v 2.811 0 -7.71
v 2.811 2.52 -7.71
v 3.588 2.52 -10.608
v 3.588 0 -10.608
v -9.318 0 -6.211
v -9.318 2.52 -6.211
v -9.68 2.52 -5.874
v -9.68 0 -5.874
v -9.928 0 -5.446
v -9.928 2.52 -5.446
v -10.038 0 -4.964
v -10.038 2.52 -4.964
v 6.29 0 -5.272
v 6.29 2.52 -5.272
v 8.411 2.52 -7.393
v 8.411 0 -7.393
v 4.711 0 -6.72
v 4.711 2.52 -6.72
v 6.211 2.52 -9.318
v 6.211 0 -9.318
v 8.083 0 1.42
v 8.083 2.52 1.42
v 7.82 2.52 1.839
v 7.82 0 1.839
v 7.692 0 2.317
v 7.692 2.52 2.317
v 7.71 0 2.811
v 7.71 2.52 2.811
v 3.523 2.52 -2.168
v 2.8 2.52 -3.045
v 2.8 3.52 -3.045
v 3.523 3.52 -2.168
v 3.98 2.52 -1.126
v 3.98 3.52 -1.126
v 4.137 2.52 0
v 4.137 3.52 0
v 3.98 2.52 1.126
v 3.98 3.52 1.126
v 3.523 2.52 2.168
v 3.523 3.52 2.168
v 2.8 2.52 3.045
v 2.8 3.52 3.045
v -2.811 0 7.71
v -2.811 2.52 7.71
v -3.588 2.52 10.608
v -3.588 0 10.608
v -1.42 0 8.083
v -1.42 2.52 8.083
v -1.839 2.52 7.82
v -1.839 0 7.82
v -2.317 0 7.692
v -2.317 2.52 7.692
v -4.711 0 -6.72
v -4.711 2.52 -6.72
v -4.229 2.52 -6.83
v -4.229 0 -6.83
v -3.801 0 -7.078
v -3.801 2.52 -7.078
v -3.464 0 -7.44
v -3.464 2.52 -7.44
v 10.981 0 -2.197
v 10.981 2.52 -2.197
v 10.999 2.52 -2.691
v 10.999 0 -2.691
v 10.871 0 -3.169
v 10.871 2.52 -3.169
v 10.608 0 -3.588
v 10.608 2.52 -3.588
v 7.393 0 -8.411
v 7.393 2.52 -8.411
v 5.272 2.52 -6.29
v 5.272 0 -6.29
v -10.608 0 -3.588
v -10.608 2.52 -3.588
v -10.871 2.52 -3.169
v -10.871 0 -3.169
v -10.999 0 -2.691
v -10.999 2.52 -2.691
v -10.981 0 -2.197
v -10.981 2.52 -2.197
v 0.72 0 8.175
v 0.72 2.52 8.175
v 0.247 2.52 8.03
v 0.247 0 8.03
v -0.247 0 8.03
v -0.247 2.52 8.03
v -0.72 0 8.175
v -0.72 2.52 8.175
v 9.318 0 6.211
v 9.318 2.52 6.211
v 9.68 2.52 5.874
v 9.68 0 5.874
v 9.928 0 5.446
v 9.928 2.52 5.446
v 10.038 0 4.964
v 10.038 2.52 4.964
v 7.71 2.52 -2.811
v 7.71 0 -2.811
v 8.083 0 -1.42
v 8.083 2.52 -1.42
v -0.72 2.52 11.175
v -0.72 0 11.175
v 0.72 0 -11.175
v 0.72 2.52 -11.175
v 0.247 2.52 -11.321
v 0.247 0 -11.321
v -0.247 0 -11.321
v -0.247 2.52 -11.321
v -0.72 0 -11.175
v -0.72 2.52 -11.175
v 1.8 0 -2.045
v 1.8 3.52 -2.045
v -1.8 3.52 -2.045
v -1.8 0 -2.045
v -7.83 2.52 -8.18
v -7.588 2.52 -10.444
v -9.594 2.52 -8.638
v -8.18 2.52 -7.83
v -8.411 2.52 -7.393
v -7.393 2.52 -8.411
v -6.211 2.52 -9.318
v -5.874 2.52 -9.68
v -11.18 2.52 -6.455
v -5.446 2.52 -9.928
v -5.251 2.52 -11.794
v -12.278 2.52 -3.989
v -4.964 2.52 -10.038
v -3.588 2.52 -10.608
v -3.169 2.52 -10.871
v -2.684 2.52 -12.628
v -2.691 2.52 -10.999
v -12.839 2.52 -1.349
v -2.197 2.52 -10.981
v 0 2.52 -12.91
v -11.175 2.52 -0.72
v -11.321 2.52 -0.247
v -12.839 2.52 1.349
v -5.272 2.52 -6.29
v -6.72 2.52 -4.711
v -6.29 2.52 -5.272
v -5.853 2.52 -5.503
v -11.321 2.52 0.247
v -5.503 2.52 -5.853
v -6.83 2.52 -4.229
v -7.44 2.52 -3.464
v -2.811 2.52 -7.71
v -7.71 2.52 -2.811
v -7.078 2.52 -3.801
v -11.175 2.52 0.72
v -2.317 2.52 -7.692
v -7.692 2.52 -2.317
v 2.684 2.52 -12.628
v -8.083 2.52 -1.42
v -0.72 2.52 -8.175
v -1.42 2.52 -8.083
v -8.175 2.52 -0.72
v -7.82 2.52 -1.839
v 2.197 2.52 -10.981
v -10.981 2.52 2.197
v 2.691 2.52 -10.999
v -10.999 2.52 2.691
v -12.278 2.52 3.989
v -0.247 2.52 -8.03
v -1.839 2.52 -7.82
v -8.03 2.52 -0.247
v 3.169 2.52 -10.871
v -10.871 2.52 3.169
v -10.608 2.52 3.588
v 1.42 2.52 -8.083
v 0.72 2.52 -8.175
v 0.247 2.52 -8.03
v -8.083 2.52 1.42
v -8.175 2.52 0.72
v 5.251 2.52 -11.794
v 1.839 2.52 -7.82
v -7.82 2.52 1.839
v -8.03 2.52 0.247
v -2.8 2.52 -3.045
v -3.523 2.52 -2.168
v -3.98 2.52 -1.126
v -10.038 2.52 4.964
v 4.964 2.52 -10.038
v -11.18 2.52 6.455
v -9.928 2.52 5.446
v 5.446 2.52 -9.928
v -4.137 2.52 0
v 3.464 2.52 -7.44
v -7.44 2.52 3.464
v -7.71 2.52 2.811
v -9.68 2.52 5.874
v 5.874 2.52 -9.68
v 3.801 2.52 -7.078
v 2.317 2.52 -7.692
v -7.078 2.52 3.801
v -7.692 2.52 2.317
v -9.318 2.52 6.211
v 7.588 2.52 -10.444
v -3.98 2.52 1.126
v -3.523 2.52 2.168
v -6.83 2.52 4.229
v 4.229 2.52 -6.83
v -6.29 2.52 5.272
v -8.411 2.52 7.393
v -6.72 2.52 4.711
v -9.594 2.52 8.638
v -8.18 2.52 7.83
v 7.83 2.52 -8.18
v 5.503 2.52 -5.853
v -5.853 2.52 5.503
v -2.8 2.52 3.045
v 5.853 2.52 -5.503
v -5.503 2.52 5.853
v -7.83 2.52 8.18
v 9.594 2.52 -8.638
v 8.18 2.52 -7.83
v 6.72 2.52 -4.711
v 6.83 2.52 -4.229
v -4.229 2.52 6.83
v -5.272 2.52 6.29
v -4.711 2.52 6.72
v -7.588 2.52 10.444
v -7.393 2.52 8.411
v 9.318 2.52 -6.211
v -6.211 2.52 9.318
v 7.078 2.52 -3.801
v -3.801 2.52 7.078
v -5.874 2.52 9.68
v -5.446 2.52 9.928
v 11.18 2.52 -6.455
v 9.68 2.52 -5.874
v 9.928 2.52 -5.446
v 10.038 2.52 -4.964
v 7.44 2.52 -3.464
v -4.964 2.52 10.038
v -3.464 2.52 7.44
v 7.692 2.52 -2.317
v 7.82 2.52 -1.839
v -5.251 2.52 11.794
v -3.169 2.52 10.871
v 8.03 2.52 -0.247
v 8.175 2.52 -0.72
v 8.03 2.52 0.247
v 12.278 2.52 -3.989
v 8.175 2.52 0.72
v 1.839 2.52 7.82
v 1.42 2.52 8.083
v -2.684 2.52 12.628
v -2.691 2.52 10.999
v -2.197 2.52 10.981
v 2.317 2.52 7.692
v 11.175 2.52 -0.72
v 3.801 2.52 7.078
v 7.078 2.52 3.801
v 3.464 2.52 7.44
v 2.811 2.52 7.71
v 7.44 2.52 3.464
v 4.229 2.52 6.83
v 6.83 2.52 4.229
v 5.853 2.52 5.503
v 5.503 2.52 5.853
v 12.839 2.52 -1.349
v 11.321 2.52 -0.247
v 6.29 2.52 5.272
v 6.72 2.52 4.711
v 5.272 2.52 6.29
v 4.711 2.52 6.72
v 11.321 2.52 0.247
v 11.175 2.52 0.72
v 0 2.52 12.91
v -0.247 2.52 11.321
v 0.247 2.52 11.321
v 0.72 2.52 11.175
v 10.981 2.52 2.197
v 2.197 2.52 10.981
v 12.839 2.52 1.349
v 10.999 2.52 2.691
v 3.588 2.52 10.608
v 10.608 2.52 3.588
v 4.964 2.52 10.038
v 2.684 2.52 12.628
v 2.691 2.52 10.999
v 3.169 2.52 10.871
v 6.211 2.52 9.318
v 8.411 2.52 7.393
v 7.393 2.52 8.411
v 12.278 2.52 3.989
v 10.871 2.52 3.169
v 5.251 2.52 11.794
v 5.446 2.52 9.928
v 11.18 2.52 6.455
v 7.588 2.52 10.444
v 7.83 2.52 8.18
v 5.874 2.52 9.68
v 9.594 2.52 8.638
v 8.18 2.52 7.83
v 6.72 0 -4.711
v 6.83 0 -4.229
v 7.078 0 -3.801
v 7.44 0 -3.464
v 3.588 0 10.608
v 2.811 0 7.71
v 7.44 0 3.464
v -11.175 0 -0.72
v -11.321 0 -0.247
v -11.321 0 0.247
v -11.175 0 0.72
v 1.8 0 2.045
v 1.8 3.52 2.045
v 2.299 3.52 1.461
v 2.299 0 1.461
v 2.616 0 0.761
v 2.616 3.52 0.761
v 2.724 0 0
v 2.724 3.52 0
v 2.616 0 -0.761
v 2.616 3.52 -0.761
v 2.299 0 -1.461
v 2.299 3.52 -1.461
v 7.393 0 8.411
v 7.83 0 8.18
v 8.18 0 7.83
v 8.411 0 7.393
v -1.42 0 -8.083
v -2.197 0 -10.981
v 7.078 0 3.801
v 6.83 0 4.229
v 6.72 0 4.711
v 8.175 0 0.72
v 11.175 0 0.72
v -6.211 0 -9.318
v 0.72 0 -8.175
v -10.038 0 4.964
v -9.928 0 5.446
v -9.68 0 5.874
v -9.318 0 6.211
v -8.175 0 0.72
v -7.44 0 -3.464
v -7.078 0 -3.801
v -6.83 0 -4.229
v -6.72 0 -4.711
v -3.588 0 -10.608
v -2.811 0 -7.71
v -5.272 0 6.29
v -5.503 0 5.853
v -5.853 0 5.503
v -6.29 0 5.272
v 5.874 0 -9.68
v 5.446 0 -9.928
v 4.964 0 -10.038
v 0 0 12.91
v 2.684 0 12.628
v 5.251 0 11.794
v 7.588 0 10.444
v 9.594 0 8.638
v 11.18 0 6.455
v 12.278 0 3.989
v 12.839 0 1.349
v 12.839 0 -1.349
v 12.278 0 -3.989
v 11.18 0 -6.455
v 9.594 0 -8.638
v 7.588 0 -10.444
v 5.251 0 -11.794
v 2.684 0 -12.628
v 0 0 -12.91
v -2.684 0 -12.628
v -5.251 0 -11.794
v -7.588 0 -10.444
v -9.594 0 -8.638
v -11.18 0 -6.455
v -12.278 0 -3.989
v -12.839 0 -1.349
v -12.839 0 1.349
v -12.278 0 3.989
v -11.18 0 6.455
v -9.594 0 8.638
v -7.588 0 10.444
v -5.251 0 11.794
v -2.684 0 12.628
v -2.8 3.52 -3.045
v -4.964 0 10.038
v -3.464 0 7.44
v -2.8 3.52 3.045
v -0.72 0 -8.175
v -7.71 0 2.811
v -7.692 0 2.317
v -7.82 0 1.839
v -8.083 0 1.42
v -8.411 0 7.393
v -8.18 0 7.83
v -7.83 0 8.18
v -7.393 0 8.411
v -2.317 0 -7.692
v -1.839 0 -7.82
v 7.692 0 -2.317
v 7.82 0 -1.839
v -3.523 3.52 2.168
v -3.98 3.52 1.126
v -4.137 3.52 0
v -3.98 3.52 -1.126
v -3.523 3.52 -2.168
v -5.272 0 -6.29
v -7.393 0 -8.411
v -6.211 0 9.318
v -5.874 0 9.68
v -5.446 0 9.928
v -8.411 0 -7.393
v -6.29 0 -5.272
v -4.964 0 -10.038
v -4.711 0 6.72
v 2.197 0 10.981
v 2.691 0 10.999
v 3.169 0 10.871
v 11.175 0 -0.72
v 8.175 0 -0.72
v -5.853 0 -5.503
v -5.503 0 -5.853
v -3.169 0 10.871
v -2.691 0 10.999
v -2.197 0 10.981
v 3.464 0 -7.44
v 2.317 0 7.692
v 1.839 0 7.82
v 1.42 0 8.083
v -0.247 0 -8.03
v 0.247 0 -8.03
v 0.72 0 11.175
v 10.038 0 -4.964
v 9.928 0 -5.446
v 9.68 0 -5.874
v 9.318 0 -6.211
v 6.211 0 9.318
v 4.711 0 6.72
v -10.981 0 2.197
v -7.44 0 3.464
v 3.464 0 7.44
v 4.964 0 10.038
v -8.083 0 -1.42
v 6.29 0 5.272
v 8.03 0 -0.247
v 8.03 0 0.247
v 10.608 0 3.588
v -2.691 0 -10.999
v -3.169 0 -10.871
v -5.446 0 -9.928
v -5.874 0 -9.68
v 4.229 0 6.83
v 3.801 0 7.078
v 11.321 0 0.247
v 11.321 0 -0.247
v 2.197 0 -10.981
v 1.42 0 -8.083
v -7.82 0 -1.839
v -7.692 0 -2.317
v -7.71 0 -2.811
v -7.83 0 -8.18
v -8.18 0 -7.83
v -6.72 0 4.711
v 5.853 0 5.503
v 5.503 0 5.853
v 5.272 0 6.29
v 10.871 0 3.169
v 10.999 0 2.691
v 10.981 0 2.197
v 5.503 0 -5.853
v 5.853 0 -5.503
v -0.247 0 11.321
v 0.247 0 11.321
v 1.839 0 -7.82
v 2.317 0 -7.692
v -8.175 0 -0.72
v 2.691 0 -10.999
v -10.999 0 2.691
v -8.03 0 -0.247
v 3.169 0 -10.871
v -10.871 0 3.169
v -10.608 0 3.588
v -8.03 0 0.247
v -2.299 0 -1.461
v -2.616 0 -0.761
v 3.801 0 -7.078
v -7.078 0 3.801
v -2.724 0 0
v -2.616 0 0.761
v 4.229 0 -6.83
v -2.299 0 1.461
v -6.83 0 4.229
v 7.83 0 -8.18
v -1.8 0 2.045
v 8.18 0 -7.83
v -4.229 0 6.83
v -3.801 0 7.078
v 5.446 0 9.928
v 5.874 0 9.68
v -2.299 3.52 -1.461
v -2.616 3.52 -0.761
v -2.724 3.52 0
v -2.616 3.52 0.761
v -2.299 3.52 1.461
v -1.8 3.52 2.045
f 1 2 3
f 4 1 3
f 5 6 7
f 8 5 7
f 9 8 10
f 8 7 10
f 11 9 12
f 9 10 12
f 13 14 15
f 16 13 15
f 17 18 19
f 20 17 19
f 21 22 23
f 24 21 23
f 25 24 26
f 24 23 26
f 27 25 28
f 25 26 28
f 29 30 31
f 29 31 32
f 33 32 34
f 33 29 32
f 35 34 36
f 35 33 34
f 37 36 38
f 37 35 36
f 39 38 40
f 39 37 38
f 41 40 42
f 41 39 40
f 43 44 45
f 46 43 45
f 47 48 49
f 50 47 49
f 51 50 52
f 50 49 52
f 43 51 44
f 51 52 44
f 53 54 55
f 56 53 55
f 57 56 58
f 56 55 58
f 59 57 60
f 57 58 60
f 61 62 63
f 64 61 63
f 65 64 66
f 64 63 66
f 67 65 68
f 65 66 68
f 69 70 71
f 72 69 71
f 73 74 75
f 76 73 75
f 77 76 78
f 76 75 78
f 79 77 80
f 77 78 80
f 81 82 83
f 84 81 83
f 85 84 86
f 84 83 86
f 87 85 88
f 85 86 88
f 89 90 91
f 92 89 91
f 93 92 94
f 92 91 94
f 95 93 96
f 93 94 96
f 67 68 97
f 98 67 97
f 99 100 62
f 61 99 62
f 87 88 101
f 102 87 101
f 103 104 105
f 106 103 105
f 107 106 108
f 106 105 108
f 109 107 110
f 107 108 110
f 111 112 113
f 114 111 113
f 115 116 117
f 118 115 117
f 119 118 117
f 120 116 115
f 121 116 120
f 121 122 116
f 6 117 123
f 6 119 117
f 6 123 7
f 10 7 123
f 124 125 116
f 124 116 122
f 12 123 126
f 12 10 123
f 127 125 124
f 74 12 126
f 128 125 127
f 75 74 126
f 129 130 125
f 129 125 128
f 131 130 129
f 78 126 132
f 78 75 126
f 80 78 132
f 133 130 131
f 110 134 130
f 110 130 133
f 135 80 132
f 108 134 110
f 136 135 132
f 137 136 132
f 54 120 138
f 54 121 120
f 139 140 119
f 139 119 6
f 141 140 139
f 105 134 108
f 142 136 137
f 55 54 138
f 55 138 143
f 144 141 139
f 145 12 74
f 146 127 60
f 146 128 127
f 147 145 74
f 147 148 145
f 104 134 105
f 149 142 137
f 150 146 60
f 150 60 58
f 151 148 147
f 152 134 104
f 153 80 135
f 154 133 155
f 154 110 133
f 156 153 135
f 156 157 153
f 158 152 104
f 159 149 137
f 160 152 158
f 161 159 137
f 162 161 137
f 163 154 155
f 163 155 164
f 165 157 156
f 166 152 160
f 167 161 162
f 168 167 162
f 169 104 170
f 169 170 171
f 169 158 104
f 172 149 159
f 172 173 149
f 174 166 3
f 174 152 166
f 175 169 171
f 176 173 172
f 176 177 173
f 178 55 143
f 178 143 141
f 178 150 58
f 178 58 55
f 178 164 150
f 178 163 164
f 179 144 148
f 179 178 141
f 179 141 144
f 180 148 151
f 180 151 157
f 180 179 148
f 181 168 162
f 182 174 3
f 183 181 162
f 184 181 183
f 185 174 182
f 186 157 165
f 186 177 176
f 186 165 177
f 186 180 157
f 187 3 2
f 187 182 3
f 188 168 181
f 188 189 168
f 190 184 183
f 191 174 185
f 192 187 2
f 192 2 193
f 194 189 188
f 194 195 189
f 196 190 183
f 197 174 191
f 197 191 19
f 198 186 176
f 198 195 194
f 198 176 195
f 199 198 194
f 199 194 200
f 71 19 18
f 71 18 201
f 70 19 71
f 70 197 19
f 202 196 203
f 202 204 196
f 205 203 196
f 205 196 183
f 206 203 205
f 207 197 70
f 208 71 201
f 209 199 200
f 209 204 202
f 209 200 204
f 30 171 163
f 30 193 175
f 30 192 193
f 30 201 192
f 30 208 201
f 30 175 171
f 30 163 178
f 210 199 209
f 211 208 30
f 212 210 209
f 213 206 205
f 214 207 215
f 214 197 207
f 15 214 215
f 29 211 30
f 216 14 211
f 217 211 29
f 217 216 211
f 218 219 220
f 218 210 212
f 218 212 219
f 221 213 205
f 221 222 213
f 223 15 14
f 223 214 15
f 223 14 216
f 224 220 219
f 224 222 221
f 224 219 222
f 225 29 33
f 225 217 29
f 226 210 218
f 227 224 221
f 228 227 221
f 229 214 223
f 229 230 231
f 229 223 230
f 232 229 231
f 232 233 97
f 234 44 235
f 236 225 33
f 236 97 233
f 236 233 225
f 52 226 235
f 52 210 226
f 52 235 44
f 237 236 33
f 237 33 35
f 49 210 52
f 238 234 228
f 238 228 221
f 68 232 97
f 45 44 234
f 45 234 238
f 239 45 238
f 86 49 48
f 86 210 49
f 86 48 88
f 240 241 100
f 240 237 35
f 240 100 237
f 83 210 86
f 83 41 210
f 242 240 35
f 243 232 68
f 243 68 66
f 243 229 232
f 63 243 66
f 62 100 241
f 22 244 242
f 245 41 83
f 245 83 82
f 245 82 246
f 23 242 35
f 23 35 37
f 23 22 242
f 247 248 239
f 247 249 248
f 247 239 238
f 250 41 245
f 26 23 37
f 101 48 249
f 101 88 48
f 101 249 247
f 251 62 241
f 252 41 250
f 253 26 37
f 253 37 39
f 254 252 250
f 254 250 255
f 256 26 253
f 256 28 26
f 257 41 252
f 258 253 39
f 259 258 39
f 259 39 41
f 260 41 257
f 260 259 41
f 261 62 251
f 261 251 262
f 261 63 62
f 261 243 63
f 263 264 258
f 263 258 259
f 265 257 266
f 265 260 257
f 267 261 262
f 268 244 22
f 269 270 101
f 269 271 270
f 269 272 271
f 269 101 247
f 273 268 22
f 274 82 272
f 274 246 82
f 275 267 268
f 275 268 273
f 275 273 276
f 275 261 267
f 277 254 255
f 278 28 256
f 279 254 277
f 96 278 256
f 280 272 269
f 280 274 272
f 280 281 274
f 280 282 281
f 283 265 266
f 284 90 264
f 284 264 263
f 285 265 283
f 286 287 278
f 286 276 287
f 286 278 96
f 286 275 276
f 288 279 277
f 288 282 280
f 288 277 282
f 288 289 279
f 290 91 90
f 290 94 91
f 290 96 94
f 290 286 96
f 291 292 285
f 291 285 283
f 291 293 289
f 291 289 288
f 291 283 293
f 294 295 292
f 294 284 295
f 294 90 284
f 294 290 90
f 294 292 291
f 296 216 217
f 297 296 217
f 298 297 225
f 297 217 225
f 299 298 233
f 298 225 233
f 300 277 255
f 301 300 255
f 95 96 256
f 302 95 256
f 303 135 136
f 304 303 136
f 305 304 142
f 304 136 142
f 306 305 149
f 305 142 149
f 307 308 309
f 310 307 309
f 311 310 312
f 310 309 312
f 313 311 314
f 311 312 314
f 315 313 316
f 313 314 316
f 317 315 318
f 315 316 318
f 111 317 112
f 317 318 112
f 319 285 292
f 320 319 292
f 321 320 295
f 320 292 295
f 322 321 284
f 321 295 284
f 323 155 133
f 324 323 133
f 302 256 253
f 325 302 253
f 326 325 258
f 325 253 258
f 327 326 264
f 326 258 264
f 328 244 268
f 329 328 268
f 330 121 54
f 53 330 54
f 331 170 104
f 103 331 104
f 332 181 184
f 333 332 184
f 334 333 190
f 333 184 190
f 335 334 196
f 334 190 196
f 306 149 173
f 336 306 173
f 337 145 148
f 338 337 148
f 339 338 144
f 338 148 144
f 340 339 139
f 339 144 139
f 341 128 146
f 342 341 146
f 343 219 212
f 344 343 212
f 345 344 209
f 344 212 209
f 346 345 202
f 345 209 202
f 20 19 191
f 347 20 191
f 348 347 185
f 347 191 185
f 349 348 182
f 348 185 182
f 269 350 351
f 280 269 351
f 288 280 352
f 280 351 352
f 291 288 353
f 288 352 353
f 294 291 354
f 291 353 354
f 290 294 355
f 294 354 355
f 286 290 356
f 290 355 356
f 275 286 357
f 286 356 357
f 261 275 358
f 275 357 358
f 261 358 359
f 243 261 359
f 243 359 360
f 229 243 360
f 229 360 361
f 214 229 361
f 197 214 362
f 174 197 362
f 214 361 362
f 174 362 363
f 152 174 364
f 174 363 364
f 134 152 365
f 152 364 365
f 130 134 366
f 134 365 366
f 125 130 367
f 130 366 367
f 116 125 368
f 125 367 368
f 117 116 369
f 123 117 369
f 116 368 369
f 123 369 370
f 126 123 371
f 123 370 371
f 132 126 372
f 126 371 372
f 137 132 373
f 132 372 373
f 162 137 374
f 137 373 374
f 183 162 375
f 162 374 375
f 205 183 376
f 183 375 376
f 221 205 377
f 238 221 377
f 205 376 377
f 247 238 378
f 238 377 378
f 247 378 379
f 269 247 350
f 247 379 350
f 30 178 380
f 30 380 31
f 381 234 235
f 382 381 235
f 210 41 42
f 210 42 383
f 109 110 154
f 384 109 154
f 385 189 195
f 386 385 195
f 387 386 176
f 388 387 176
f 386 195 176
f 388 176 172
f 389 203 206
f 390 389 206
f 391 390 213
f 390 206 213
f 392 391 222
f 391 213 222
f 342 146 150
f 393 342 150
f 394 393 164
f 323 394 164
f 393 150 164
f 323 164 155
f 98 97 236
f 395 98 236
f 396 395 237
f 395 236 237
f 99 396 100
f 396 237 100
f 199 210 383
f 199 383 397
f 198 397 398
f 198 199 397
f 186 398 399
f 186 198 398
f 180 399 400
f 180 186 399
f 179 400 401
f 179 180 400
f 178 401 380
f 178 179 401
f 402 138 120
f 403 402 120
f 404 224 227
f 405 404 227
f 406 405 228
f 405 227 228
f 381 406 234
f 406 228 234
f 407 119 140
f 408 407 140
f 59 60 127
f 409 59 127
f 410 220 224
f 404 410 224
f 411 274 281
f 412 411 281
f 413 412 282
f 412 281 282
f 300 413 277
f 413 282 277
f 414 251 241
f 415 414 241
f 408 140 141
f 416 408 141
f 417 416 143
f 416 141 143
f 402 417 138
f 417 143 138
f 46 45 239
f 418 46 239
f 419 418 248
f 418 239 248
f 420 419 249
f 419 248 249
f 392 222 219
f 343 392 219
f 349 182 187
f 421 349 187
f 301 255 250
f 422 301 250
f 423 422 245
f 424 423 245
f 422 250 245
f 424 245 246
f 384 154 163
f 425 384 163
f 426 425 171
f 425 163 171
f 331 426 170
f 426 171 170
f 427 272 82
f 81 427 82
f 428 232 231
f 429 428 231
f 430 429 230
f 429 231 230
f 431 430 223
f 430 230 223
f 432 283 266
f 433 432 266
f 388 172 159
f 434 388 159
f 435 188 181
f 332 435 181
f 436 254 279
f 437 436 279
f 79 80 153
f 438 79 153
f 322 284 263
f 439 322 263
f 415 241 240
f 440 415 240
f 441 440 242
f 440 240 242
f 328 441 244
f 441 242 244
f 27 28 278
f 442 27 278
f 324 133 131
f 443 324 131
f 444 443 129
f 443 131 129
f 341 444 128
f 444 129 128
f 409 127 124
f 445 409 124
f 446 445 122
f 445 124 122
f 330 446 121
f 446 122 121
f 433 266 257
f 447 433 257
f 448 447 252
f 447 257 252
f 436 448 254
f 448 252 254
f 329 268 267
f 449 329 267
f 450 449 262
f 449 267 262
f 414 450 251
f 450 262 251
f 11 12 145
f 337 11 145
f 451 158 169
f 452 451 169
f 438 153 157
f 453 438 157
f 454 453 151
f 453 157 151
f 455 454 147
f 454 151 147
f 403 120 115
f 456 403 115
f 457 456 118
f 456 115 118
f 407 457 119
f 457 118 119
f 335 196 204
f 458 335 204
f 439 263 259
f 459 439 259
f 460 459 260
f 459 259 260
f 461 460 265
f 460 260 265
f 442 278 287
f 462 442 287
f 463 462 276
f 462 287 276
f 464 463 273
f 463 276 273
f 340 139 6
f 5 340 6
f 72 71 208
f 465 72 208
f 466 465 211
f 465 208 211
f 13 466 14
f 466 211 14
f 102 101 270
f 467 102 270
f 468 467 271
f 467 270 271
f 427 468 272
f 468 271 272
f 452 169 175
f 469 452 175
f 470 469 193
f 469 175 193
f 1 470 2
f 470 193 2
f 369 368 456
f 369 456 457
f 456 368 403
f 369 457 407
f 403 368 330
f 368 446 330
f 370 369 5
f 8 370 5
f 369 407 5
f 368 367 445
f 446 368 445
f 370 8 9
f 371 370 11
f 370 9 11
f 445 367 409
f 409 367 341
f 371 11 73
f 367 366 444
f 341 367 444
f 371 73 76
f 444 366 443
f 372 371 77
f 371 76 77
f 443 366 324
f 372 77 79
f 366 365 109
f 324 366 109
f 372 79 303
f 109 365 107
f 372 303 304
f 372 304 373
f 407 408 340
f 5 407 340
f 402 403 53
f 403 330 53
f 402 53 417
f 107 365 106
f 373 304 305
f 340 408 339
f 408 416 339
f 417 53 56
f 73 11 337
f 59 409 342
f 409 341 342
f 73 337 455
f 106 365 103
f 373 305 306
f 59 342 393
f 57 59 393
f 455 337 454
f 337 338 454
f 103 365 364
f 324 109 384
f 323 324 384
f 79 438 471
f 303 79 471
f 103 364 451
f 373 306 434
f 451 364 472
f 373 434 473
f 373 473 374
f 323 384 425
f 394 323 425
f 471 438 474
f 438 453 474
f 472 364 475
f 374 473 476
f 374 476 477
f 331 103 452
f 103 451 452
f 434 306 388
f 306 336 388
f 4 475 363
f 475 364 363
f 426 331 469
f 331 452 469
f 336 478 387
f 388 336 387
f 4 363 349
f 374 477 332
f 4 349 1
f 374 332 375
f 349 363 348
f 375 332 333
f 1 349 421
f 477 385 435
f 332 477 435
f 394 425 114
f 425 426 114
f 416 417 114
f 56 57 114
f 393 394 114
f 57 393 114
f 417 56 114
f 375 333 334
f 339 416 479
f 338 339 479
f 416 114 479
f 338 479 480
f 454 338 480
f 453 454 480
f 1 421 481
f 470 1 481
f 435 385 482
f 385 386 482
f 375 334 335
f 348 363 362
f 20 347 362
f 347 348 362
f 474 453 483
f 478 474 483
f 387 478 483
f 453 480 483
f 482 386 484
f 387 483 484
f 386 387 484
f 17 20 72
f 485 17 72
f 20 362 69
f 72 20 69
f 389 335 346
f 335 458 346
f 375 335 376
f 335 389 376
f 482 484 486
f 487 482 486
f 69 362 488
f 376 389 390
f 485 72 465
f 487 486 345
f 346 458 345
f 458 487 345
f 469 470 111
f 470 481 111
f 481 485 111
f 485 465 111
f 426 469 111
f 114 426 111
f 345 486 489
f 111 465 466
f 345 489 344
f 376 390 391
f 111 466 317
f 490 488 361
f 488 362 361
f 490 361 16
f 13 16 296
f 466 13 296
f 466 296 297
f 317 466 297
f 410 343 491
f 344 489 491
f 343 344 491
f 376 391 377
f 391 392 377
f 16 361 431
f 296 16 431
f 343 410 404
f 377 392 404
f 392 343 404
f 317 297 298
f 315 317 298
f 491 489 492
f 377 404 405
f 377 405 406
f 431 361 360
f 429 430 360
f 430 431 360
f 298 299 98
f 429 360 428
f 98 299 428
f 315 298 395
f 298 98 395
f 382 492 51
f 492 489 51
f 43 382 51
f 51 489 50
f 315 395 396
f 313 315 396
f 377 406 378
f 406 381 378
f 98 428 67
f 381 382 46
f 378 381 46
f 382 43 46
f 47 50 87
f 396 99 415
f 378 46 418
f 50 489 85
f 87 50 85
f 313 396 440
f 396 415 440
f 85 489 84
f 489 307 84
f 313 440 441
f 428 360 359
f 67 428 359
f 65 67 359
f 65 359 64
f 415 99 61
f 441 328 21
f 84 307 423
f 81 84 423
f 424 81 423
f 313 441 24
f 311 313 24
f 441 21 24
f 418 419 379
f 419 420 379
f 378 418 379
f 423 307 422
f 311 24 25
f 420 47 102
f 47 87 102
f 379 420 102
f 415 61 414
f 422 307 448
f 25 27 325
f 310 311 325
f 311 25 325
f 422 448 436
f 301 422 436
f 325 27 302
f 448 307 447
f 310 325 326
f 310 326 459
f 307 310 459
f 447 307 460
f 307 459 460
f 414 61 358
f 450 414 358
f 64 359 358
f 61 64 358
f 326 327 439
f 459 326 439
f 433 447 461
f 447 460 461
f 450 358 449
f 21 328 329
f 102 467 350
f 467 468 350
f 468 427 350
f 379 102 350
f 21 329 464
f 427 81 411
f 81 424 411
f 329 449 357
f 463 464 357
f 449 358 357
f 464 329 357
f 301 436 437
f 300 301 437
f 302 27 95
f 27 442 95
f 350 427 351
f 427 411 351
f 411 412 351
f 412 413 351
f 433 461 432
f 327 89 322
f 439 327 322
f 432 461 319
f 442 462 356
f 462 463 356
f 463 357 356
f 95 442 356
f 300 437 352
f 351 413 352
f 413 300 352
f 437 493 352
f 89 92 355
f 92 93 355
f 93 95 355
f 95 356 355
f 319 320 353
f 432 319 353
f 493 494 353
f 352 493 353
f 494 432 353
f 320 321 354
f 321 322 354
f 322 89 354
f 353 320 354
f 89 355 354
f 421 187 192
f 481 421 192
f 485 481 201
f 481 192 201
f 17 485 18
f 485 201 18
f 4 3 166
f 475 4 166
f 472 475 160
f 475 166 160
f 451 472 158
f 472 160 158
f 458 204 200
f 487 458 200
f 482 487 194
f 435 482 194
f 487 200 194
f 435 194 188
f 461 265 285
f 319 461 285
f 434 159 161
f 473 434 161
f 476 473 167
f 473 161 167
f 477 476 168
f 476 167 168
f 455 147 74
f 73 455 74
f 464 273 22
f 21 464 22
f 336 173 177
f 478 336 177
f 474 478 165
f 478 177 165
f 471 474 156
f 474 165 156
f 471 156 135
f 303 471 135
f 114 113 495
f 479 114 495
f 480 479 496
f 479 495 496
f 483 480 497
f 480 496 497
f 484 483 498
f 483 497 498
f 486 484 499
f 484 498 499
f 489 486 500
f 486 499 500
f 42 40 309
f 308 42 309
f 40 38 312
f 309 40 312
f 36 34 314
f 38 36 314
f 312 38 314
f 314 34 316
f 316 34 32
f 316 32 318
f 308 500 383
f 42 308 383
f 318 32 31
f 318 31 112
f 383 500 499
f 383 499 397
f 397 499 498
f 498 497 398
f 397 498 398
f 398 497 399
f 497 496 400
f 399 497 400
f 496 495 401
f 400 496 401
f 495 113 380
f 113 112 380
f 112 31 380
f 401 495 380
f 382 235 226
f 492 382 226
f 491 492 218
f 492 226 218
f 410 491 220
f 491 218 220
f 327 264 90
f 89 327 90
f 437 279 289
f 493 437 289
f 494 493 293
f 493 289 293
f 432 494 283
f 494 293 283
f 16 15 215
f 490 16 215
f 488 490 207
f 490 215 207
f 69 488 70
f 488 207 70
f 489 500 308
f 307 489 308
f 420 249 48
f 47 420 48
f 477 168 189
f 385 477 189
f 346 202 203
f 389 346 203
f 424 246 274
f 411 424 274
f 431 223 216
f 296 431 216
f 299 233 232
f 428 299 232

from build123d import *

# Parameters (mm, degrees)
SKETCH_1_R               = 12.91
EXTRUDE_1_DEPTH          = 2.52
EXTRUDE_2_DEPTH          = 1
CUT_EXTRUDE_1_DEPTH      = 4
CUT_EXTRUDE_2_DEPTH      = 4
PATTERN_CIRCULAR_1_COUNT = 24


with BuildPart() as part:
    # 草图1 → 凸台-拉伸1 (new body)
    with BuildSketch(Plane(origin=(0, 0, 0), x_dir=(1, 0, 0), z_dir=(0, 1, 0))):
        with Locations(Location((0, 0, 0), (0, 0, 270))):
            Circle(SKETCH_1_R)
    extrude(amount=EXTRUDE_1_DEPTH)

    # 草图2 → 凸台-拉伸2 (add)
    with BuildSketch(Plane(origin=(0, 2.52, 0), x_dir=(1, 0, 0), z_dir=(0, 1, 0))):
        with BuildLine():
            Line((-2.8, 3.045), (2.8, 3.045))
            ThreePointArc((2.8, 3.045), (4.136668345, 0), (2.8, -3.045))
            Line((2.8, -3.045), (-2.8, -3.045))
            ThreePointArc((-2.8, -3.045), (-4.136668345, 0), (-2.8, 3.045))
        make_face()
    extrude(amount=EXTRUDE_2_DEPTH)

    # 草图3 → 切除-拉伸1 (cut)
    with BuildSketch(Plane(origin=(0, 3.52, 0), x_dir=(1, 0, 0), z_dir=(0, 1, 0))):
        with BuildLine():
            Line((-1.8, -2.045), (1.8, -2.045))
            ThreePointArc((1.8, -2.045), (2.724339369, 0), (1.8, 2.045))
            Line((1.8, 2.045), (-1.8, 2.045))
            ThreePointArc((-1.8, 2.045), (-2.724339369, 0), (-1.8, -2.045))
        make_face()
    extrude(amount=-CUT_EXTRUDE_1_DEPTH, mode=Mode.SUBTRACT)

    # 草图4 → 切除-拉伸2 (cut)
    with BuildSketch(Plane(origin=(0, 2.52, 0), x_dir=(1, 0, 0), z_dir=(0, 1, 0))):
        with BuildLine():
            Line((-11.175157972, -0.72), (-8.175157972, -0.72))
            ThreePointArc((-8.175157972, -0.72), (-8.011307018, 0), (-8.175157972, 0.72))
            Line((-8.175157972, 0.72), (-11.175157972, 0.72))
            ThreePointArc((-11.175157972, 0.72), (-11.339008927, 0), (-11.175157972, -0.72))
        make_face()
    cut_extrude_2 = extrude(amount=-CUT_EXTRUDE_2_DEPTH, mode=Mode.SUBTRACT)

    # 阵列(圆周)1: 切除-拉伸2 ×24 about axis
    pattern_circular_1_axis = Axis((0, 0, 0), (0, 1, 0))
    for i in range(1, PATTERN_CIRCULAR_1_COUNT):
        add(cut_extrude_2.rotate(pattern_circular_1_axis, i * 360 / PATTERN_CIRCULAR_1_COUNT), mode=Mode.SUBTRACT)


solid = part.part
